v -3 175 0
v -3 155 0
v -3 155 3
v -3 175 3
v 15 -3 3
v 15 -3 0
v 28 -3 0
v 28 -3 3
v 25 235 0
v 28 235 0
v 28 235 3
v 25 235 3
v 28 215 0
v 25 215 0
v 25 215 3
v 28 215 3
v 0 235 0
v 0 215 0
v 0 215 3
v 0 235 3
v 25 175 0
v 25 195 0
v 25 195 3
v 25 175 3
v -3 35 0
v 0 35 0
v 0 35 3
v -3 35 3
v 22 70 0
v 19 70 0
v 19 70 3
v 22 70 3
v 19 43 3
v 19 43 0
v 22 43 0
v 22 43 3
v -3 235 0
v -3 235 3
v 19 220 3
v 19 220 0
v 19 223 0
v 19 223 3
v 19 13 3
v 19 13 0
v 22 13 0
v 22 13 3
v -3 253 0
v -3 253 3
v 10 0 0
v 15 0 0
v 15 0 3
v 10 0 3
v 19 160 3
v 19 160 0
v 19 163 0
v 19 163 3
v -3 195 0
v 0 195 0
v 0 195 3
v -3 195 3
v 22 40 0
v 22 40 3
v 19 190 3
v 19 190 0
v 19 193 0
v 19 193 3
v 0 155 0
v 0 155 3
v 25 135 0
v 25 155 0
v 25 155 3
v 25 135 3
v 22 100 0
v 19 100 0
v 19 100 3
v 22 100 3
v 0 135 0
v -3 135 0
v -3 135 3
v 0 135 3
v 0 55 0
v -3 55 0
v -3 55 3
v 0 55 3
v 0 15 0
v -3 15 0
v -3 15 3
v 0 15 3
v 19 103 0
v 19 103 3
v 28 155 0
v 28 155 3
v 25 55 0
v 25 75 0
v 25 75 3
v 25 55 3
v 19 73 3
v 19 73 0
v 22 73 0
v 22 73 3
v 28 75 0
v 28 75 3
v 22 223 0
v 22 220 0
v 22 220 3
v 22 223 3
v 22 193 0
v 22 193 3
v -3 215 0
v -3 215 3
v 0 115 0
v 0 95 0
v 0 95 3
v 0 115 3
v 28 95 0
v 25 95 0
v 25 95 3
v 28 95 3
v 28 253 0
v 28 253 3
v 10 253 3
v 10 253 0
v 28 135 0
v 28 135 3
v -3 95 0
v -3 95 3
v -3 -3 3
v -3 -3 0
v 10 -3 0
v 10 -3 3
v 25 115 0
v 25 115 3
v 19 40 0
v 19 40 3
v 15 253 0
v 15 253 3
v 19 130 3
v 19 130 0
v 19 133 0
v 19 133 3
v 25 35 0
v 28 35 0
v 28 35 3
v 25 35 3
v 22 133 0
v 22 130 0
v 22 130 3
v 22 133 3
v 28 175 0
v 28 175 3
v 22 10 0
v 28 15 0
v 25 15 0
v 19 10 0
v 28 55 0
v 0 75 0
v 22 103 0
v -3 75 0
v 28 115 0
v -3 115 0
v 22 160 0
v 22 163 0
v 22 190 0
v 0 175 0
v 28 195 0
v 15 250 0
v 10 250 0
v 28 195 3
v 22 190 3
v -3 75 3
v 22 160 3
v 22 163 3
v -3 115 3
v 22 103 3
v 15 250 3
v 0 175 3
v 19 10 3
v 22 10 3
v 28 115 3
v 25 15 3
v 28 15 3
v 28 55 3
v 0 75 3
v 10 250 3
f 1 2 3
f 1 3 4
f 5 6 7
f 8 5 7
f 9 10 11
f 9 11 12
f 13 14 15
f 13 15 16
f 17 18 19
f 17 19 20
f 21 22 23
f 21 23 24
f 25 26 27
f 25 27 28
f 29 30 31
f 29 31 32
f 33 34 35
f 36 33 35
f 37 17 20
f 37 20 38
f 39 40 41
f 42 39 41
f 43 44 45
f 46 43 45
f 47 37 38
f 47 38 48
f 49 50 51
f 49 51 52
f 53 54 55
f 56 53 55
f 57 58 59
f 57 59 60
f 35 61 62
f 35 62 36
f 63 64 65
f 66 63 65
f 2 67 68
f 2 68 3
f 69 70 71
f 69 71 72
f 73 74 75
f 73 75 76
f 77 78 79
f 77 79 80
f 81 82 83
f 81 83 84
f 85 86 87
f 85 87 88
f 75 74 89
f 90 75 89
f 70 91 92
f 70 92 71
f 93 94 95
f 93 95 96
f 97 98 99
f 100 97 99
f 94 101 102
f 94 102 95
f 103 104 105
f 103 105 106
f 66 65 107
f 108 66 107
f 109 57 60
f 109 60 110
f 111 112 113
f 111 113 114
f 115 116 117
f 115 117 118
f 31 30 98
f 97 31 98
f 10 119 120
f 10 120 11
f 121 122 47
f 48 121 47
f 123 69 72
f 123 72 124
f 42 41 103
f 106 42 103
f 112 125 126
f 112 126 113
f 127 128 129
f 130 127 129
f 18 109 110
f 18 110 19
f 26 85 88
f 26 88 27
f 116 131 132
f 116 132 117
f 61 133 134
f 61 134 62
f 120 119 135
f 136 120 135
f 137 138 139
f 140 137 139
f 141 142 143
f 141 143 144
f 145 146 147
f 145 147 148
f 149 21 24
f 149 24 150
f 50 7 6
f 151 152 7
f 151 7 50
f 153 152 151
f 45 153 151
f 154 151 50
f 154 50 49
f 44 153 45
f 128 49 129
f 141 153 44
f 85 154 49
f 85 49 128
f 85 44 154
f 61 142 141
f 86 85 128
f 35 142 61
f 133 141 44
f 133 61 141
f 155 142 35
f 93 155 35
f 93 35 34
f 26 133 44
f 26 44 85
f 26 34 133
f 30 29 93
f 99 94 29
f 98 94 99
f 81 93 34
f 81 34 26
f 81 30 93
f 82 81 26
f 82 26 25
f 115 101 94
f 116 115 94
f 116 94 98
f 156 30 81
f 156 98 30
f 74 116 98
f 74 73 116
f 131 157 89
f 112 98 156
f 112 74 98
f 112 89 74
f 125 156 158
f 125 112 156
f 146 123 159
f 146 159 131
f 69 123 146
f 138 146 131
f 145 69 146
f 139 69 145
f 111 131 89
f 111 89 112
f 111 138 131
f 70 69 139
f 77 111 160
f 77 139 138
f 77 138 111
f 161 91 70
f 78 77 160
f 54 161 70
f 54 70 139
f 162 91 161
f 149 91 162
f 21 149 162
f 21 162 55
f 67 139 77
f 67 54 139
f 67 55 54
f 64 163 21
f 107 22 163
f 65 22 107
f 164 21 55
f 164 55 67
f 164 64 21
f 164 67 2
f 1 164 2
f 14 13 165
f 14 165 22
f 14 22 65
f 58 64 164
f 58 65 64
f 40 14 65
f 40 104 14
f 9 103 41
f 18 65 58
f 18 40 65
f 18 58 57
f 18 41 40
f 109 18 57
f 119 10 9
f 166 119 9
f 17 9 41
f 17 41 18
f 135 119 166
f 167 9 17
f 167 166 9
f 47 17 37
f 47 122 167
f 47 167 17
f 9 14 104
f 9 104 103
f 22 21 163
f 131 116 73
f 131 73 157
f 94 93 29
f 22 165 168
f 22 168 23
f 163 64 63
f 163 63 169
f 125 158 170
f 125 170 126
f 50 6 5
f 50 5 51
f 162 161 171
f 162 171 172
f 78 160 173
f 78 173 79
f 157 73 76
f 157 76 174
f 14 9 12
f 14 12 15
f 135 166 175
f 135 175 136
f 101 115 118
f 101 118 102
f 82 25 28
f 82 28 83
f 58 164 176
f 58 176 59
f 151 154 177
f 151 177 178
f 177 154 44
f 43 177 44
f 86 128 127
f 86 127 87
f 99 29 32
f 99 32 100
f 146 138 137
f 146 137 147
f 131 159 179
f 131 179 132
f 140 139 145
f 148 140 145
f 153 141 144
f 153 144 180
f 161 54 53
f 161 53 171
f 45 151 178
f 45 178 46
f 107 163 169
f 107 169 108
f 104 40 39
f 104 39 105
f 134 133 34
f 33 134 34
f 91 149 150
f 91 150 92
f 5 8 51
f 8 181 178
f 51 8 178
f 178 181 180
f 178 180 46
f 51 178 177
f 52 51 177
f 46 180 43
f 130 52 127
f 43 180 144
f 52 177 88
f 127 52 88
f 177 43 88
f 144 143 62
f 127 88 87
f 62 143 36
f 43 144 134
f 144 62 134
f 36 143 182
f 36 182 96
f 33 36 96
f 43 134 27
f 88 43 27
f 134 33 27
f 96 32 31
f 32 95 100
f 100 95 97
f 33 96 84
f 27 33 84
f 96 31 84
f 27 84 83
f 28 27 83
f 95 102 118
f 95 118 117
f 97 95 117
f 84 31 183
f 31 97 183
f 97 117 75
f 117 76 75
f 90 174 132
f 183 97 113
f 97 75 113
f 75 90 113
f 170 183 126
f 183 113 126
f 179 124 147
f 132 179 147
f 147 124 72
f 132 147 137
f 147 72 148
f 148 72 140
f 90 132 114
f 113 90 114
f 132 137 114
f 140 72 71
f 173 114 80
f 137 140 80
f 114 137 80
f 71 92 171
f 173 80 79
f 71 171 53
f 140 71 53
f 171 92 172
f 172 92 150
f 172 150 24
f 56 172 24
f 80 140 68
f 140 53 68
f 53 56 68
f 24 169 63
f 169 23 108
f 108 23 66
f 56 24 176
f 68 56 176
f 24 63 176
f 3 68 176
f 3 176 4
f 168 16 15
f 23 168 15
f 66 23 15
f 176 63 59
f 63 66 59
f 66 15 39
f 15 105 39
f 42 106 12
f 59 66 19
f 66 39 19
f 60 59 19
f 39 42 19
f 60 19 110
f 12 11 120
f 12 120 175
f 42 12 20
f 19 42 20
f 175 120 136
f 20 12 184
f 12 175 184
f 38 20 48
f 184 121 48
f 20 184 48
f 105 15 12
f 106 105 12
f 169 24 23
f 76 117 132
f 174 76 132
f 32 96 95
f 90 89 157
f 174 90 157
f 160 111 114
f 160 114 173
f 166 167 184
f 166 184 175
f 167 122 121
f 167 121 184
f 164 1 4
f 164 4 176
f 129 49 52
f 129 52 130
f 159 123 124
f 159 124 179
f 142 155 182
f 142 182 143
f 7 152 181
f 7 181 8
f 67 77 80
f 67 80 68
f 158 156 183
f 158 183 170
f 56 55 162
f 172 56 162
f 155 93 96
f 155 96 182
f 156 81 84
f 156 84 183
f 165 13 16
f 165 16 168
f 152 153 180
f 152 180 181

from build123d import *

# Parameters (mm, degrees)
SKETCH2_W           = 3
SKETCH2_H           = 3
BOSS_EXTRUDE2_DEPTH = 3


with BuildPart() as part:
    # Sketch2 → Boss-Extrude2 (new body)
    with BuildSketch(Plane.XY):
        Polygon((10, 250), (15, 250), (15, 253), (25, 253), (28, 253), (28, 235), (25, 235), (25, 215), (28, 215), (28, 195), (25, 195), (25, 175), (28, 175), (28, 155), (25, 155), (25, 135), (28, 135), (28, 115), (25, 115), (25, 95), (28, 95), (28, 75), (25, 75), (25, 55), (28, 55), (28, 35), (25, 35), (25, 15), (28, 15), (28, -3), (25, -3), (15, -3), (15, 0), (10, 0), (10, -3), (0, -3), (-3, -3), (-3, 15), (0, 15), (0, 35), (-3, 35), (-3, 55), (0, 55), (0, 75), (-3, 75), (-3, 95), (0, 95), (0, 115), (-3, 115), (-3, 135), (0, 135), (0, 155), (-3, 155), (-3, 175), (0, 175), (0, 195), (-3, 195), (-3, 215), (0, 215), (0, 235), (-3, 235), (-3, 253), (0, 253), (10, 253), align=None)
        with Locations((20.5, 191.5)):
            Rectangle(SKETCH2_W, SKETCH2_H, mode=Mode.SUBTRACT)
        with Locations((20.5, 221.5)):
            Rectangle(SKETCH2_W, SKETCH2_H, mode=Mode.SUBTRACT)
        with Locations((20.5, 161.5)):
            Rectangle(SKETCH2_W, SKETCH2_H, mode=Mode.SUBTRACT)
        with Locations((20.5, 131.5)):
            Rectangle(SKETCH2_W, SKETCH2_H, mode=Mode.SUBTRACT)
        with Locations((20.5, 101.5)):
            Rectangle(SKETCH2_W, SKETCH2_H, mode=Mode.SUBTRACT)
        with Locations((20.5, 71.5)):
            Rectangle(SKETCH2_W, SKETCH2_H, mode=Mode.SUBTRACT)
        with Locations((20.5, 41.5)):
            Rectangle(SKETCH2_W, SKETCH2_H, mode=Mode.SUBTRACT)
        with Locations((20.5, 11.5)):
            Rectangle(SKETCH2_W, SKETCH2_H, mode=Mode.SUBTRACT)
    extrude(amount=BOSS_EXTRUDE2_DEPTH)


solid = part.part
